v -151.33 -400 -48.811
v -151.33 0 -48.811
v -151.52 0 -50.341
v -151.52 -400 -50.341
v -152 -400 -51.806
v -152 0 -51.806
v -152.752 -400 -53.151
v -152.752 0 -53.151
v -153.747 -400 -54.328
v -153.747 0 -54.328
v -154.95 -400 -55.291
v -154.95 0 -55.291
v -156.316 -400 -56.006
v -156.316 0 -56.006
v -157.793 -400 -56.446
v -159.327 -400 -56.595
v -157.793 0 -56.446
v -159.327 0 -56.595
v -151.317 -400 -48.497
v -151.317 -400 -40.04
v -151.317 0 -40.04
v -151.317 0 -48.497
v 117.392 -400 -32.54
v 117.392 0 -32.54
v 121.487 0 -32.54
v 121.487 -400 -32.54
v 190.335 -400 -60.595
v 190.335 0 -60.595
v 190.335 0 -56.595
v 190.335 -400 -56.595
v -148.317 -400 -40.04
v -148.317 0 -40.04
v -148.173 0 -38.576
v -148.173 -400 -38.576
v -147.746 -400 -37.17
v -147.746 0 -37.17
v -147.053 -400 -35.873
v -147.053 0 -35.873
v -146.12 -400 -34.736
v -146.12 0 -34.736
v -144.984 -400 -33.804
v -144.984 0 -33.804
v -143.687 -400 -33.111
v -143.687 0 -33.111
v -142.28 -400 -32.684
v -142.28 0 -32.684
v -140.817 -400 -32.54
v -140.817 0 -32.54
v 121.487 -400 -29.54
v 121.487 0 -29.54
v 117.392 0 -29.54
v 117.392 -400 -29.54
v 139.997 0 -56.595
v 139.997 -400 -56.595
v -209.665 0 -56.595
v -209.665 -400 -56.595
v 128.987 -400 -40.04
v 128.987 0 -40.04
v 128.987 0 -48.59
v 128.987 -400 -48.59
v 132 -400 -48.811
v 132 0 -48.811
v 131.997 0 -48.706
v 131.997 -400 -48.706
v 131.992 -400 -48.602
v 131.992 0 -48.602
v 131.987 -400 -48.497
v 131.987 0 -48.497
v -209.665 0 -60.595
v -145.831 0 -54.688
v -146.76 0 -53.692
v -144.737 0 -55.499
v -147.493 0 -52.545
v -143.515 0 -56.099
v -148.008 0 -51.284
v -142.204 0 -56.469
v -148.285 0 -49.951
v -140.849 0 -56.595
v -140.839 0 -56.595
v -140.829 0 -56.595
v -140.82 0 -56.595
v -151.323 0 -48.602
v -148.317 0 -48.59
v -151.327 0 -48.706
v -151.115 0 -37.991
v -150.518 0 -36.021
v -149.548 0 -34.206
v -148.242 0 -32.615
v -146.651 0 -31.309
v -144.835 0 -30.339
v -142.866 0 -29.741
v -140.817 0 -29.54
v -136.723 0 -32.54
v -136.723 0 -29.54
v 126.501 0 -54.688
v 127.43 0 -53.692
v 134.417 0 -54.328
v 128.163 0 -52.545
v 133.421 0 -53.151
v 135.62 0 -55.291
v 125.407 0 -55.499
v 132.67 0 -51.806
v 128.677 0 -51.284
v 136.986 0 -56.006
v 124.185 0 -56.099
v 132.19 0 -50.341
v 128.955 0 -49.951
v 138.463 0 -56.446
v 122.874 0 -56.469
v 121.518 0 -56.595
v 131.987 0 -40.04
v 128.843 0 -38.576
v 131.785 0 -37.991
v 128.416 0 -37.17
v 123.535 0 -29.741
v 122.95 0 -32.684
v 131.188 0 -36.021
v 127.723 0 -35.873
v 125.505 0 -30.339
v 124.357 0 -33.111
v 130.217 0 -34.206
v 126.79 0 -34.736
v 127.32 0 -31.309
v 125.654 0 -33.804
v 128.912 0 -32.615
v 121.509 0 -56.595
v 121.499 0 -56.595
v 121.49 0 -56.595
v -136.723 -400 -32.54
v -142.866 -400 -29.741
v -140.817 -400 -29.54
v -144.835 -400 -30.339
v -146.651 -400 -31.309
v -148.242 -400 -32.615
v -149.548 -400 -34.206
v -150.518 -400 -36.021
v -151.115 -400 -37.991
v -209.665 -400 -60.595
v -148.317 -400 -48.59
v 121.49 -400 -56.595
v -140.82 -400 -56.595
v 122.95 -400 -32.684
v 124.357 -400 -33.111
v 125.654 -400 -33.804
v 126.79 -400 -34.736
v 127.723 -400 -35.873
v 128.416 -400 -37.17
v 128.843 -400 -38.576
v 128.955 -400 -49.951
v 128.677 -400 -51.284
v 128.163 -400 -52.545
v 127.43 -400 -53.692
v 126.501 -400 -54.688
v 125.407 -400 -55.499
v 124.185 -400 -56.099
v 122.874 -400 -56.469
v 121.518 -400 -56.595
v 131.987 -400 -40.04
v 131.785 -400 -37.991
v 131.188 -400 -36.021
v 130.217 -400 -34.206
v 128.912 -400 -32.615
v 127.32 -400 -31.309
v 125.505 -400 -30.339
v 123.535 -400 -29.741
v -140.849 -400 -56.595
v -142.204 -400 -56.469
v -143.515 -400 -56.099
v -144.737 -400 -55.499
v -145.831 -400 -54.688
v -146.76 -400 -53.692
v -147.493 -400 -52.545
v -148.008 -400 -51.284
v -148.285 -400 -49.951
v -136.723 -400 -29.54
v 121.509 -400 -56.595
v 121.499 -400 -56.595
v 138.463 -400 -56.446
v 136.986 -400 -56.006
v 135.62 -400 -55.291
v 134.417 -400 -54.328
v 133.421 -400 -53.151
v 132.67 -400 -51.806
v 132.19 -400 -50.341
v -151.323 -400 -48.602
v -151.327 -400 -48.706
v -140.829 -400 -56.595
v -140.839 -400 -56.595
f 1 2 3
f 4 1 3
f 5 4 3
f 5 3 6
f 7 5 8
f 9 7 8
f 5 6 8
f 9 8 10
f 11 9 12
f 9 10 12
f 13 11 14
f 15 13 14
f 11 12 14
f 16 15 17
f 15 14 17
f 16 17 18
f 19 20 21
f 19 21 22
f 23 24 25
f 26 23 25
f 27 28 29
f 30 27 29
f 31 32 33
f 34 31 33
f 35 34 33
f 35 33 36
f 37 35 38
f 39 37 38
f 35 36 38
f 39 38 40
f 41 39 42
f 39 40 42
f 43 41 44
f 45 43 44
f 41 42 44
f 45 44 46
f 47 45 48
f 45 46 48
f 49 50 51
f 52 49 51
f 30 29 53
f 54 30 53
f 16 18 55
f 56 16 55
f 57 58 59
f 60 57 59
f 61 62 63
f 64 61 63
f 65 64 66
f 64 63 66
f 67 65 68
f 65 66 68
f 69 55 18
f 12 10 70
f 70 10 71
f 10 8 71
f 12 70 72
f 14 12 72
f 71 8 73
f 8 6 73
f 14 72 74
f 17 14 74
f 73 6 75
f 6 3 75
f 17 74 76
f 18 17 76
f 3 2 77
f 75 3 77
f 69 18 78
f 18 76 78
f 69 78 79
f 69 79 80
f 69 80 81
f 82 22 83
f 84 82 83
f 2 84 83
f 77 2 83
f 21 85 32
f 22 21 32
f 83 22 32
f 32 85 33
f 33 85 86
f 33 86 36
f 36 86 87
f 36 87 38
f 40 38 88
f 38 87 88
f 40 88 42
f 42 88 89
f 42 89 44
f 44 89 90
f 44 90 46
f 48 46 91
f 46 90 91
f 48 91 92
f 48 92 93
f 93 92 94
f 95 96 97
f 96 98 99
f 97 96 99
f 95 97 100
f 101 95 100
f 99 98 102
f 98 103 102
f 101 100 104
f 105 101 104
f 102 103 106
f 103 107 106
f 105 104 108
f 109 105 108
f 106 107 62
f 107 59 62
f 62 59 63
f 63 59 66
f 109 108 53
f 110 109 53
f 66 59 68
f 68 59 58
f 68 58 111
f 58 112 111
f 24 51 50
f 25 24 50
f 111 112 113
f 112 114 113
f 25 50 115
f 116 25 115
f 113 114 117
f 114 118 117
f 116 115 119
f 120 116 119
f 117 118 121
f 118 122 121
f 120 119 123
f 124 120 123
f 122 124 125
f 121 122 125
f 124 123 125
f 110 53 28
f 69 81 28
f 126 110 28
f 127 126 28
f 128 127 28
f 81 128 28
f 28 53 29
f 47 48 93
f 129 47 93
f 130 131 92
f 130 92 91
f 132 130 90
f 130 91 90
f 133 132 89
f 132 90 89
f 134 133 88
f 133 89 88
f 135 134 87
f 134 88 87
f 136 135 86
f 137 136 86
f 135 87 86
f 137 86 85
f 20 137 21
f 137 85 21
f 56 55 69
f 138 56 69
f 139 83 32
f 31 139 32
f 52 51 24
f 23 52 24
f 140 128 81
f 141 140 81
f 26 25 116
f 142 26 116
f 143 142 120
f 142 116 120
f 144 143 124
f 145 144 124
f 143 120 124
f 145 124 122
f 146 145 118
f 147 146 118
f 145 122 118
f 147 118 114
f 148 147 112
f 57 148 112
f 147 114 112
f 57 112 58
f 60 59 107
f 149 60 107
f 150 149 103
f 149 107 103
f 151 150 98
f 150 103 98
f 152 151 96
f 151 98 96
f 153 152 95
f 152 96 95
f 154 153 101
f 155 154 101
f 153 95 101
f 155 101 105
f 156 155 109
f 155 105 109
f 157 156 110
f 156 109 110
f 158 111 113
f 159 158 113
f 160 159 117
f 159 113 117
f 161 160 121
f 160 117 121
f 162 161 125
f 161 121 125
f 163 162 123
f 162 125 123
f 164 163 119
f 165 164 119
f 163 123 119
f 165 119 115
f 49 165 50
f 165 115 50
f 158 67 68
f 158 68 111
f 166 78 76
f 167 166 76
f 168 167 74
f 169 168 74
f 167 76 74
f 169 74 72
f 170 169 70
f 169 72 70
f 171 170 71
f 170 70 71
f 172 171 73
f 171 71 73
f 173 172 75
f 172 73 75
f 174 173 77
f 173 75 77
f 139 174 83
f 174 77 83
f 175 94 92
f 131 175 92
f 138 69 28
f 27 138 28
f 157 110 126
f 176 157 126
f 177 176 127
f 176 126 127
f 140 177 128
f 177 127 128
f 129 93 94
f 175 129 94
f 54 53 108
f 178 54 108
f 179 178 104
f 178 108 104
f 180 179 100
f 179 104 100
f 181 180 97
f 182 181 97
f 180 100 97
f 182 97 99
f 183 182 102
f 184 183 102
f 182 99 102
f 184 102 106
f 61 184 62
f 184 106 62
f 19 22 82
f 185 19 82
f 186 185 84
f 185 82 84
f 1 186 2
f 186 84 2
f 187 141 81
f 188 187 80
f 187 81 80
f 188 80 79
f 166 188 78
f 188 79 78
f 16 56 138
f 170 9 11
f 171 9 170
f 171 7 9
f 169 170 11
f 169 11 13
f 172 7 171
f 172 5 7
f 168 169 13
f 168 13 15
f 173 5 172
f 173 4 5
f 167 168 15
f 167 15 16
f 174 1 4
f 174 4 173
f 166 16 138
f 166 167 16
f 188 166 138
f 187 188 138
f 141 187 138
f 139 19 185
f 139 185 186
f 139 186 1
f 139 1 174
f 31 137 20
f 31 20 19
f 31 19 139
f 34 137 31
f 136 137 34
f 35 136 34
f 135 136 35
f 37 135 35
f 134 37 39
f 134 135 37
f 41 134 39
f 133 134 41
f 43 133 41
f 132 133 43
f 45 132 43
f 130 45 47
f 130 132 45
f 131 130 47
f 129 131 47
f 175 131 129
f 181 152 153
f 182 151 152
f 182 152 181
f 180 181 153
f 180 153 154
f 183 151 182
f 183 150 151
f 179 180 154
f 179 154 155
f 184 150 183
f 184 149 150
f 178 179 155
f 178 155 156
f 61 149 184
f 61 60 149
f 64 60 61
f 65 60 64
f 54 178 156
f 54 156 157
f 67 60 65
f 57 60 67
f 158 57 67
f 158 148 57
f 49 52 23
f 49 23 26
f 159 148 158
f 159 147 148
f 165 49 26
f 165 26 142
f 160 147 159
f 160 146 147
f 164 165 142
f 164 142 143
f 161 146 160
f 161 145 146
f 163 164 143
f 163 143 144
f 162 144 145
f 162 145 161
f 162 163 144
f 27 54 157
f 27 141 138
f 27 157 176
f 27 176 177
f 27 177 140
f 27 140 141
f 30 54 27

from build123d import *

# Parameters (mm, degrees)
F1_DEPTH = 400


with BuildPart() as f1:
    # F0 (on Front) → F1 (new body)
    with BuildSketch(Plane.XZ):
        with BuildLine():
            Line((-103.557974, -56.594891), (-140.819733, -56.594891))
            ThreePointArc((-140.819733, -56.594891), (-140.834136, -56.594905), (-140.848538, -56.594891))
            ThreePointArc((-140.848538, -56.594891), (-146.318086, -54.211179), (-148.31709, -48.589611))
            Line((-148.31709, -48.589611), (-148.31709, -40.039665))
            ThreePointArc((-148.31709, -40.039665), (-146.120392, -34.736367), (-140.817094, -32.539669))
            Line((-140.817094, -32.539669), (-136.722556, -32.539669))
            Line((-136.722556, -32.539669), (-136.722556, -29.539669))
            Line((-136.722556, -29.539669), (-140.817094, -29.539669))
            ThreePointArc((-140.817094, -29.539669), (-148.241712, -32.615047), (-151.31709, -40.039665))
            Line((-151.31709, -40.039665), (-151.31709, -48.496935))
            ThreePointArc((-151.31709, -48.496935), (-151.324869, -48.653976), (-151.330295, -48.811115))
            ThreePointArc((-151.330295, -48.811115), (-153.747489, -54.327682), (-159.327372, -56.594891))
            Line((-159.327372, -56.594891), (-209.665096, -56.594891))
            Line((-209.665096, -56.594891), (-209.665096, -60.594891))
            Line((-209.665096, -60.594891), (-9.665096, -60.594891))
            Line((-9.665096, -60.594891), (190.334904, -60.594891))
            Line((190.334904, -60.594891), (190.334904, -56.594891))
            Line((190.334904, -56.594891), (139.997181, -56.594891))
            ThreePointArc((139.997181, -56.594891), (134.417297, -54.327682), (132.000103, -48.811115))
            ThreePointArc((132.000103, -48.811115), (131.994677, -48.653976), (131.986898, -48.496935))
            Line((131.986898, -48.496935), (131.986898, -40.039665))
            ThreePointArc((131.986898, -40.039665), (128.911521, -32.615047), (121.486903, -29.539669))
            Line((121.486903, -29.539669), (117.392364, -29.539669))
            Line((117.392364, -29.539669), (117.392364, -32.539669))
            Line((117.392364, -32.539669), (121.486903, -32.539669))
            ThreePointArc((121.486903, -32.539669), (126.7902, -34.736367), (128.986898, -40.039665))
            Line((128.986898, -40.039665), (128.986898, -48.589611))
            ThreePointArc((128.986898, -48.589611), (126.987895, -54.211179), (121.518346, -56.594891))
            ThreePointArc((121.518346, -56.594891), (121.503944, -56.594905), (121.489541, -56.594891))
            Line((121.489541, -56.594891), (84.227782, -56.594891))
            Line((84.227782, -56.594891), (31.486903, -56.594891))
            Line((31.486903, -56.594891), (-9.665096, -56.594891))
            Line((-9.665096, -56.594891), (-50.817094, -56.594891))
            Line((-50.817094, -56.594891), (-59.151821, -56.594891))
            Line((-59.151821, -56.594891), (-103.557974, -56.594891))
        make_face()
    extrude(amount=F1_DEPTH)


solid = f1.part
